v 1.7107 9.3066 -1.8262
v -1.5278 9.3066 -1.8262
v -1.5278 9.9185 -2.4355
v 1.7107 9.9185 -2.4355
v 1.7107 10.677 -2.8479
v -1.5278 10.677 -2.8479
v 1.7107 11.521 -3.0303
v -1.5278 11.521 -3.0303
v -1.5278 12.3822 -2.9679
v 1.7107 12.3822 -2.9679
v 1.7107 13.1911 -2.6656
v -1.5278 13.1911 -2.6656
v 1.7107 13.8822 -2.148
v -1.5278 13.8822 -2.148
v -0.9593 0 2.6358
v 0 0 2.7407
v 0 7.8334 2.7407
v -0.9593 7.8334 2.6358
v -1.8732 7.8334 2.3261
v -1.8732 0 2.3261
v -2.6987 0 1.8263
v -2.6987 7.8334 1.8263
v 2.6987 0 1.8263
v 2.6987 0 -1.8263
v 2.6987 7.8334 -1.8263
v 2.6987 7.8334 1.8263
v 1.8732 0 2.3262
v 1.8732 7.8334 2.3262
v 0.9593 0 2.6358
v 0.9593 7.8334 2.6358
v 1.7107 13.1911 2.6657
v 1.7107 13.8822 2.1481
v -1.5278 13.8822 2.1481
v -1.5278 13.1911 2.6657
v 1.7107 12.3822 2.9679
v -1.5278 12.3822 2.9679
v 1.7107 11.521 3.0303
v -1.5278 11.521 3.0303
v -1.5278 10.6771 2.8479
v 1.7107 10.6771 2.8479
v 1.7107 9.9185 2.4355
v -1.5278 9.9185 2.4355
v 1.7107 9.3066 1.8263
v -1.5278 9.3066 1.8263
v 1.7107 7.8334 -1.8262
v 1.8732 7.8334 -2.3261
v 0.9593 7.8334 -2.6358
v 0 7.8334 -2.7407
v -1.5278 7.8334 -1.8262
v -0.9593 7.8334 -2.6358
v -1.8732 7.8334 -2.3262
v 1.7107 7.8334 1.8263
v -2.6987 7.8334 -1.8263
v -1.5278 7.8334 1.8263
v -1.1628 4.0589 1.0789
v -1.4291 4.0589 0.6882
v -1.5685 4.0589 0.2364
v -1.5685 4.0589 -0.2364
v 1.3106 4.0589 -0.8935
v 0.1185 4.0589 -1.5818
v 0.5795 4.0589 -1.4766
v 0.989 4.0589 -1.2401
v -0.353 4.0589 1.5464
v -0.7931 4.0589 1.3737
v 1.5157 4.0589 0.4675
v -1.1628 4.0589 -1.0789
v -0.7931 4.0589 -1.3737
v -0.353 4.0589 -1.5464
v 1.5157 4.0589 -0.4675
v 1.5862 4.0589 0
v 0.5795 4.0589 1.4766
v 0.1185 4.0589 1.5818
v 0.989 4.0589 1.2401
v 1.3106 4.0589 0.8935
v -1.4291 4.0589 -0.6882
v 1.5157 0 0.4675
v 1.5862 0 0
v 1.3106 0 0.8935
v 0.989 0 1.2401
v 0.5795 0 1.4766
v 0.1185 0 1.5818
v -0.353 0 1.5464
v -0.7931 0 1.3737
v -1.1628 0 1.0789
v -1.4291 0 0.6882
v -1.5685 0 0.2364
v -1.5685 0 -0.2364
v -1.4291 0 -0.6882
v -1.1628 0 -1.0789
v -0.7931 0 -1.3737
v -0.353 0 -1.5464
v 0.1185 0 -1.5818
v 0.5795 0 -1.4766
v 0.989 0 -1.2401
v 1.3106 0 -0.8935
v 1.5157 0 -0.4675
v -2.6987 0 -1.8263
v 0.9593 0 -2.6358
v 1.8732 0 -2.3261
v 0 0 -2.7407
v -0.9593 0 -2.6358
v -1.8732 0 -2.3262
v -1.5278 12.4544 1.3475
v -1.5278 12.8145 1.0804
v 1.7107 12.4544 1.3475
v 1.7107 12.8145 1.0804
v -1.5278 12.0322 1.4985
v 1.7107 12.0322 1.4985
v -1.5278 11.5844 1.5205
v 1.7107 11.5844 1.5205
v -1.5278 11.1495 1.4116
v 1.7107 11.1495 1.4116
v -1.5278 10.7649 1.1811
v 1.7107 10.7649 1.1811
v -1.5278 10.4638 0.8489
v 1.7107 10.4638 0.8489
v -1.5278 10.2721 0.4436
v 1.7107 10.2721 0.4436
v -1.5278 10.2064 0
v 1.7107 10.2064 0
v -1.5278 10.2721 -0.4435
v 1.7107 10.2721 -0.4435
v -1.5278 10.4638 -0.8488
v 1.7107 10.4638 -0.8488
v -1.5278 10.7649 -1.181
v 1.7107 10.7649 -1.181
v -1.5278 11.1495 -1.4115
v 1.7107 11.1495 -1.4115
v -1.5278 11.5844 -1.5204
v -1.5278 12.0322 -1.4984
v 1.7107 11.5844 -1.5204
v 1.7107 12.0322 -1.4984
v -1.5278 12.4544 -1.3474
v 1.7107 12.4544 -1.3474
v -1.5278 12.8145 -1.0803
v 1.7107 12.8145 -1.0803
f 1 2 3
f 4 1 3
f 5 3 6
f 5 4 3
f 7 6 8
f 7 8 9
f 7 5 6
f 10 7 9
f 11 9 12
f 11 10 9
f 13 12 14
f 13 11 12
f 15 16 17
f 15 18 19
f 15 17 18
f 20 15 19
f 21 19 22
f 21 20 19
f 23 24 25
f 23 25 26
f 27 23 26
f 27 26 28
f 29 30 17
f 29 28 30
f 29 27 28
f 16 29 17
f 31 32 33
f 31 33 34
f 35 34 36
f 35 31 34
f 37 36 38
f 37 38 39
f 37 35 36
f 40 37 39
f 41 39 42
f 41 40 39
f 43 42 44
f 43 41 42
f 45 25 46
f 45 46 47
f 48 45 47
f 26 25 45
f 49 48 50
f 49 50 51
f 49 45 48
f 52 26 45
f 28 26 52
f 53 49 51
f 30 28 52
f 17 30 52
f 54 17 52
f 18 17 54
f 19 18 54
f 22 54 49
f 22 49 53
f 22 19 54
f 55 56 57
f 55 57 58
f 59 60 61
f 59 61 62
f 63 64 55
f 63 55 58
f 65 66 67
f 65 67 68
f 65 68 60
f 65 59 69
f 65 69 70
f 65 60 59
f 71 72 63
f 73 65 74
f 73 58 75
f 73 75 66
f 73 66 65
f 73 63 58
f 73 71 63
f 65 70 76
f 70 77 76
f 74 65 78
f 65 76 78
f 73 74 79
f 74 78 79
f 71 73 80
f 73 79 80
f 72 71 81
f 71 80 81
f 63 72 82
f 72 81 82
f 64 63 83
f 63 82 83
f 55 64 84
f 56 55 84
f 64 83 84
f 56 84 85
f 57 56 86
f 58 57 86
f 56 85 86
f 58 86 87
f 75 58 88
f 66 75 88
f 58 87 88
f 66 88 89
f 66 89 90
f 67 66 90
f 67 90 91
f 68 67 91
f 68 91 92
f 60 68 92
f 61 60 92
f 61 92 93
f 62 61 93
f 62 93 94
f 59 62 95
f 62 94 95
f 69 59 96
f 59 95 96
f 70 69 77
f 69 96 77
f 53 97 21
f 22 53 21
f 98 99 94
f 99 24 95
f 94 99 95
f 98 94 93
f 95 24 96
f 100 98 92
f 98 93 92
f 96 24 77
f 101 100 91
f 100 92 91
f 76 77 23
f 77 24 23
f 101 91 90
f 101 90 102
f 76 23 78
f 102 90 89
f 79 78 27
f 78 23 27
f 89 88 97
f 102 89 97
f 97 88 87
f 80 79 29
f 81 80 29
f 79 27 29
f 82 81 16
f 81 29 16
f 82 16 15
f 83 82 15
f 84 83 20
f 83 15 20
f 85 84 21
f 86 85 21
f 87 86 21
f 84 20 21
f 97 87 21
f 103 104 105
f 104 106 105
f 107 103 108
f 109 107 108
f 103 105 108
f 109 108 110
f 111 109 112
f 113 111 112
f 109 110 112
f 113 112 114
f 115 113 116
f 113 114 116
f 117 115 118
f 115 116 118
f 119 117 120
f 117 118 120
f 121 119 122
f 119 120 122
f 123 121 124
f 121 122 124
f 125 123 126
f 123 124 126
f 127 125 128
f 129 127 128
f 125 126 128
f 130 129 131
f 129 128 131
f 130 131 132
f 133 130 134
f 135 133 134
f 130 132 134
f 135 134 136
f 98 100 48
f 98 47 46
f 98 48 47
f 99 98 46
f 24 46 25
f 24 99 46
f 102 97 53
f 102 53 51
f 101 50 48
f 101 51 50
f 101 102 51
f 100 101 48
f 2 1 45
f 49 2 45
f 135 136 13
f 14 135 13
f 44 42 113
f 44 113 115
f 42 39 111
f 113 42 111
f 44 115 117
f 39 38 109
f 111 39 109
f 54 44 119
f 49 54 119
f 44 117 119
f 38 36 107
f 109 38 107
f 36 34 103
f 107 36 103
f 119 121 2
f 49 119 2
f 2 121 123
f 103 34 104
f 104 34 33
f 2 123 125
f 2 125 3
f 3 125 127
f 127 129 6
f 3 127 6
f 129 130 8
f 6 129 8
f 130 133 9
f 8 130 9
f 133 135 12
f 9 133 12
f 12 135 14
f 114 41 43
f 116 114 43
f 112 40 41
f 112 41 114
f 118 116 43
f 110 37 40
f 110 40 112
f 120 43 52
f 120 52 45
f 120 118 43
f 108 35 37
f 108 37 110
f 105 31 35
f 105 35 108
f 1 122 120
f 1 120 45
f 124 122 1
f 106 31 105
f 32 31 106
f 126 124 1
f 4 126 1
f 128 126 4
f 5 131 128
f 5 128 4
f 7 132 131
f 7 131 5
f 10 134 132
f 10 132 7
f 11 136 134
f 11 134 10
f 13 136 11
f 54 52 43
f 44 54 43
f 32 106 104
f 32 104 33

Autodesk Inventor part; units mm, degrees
ref_plane "YZ Plane" through (0, 0, 0) normal (1, 0, 0) x (0, 1, 0)
ref_plane "XZ Plane" through (0, 0, 0) normal (0, 1, 0) x (-1, 0, 0)
sketch "Sketch1" plane through (0, 0, 0) normal (0, 1, 0) x (-1, 0, 0)
  line L0 (0, 0) -> (2.6987, 0) construction
  line L1 (2.6987, 0) -> (2.6987, -2.7407) construction
  line L2 (2.6987, -2.7407) -> (0, -2.7407) construction
  line L3 (0, -2.7407) -> (0, 0) construction
  line L4 (2.6987, 0) -> (2.6987, -1.8263) construction
  line L5 (2.6987, 0) -> (4.525, 0) construction
  arc A0 (0, -2.7407) -> (2.6987, -1.8263) centre (0, 1.6991) ccw
  line L6 (2.6987, -1.8263) -> (2.6987, 0)
  arc A1 (-2.6987, -1.8263) -> (0, -2.7407) centre (0, 1.6991) ccw
  line L7 (-2.6987, -1.8263) -> (-2.6987, 0)
  arc A2 (2.6987, 1.8263) -> (0, 2.7407) centre (0, -1.6991) ccw
  line L8 (2.6987, 1.8263) -> (2.6987, 0)
  arc A3 (0, 2.7407) -> (-2.6987, 1.8263) centre (0, -1.6991) ccw
  line L9 (-2.6987, 1.8263) -> (-2.6987, 0)
  dimension "d0" = 2.6987
  dimension "d1" = 2.7407
  dimension "d2" = 1.8263
  dimension "d3" = 90
extrude "Extrusion1" add sketch "Sketch1" along normal blind 7.8334
sketch "Sketch2" plane through (0, 0, 0) normal (0, -1, 0) x (1, 0, 0)
  circle A0 centre (0, 0) radius 1.5862
  dimension "d6" = 3.1725
extrude "Extrusion2" cut sketch "Sketch2" against normal blind 4.0589
ref_plane "Work Plane1" through (1.7107, 0, 1.8263) normal (1, 0, 0) x (0, 0, -1)
sketch "Sketch3" plane through (1.7107, 0, 1.8263) normal (1, 0, 0) x (0, 0, -1)
  line L0 (3.6525, 7.8334) -> (0, 7.8334) projected
  line L1 (3.6525, 7.8334) -> (0, 7.8334)
  line L2 (0, 7.8334) -> (0, 9.3066)
  line L3 (0, 9.3066) -> (1.8263, 9.3066) construction
  line L4 (3.6525, 9.3066) -> (3.6525, 7.8334)
  arc A0 (0.7459, 12.8145) -> (2.9066, 12.8145) centre (1.8263, 11.7342) ccw
  line L5 (1.8263, 11.7342) -> (1.8263, 14.772) construction
  line L6 (2.9066, 12.8145) -> (3.9743, 13.8822)
  line L7 (0.7459, 12.8145) -> (-0.3218, 13.8822)
  arc A1 (-0.3218, 13.8822) -> (0, 9.3066) centre (1.8263, 11.7342) ccw
  arc A2 (3.6525, 9.3066) -> (3.9743, 13.8822) centre (1.8263, 11.7342) ccw
  point P0 (1.8263, 0)
  dimension "d10" = 1.4732
  dimension "d12" = 3.0556
  dimension "d13" = 45
  dimension "d14" = 45
extrude "Extrusion3" add sketch "Sketch3" against normal blind 3.2385
properties part number "hand project" material "ABS Plastic"
